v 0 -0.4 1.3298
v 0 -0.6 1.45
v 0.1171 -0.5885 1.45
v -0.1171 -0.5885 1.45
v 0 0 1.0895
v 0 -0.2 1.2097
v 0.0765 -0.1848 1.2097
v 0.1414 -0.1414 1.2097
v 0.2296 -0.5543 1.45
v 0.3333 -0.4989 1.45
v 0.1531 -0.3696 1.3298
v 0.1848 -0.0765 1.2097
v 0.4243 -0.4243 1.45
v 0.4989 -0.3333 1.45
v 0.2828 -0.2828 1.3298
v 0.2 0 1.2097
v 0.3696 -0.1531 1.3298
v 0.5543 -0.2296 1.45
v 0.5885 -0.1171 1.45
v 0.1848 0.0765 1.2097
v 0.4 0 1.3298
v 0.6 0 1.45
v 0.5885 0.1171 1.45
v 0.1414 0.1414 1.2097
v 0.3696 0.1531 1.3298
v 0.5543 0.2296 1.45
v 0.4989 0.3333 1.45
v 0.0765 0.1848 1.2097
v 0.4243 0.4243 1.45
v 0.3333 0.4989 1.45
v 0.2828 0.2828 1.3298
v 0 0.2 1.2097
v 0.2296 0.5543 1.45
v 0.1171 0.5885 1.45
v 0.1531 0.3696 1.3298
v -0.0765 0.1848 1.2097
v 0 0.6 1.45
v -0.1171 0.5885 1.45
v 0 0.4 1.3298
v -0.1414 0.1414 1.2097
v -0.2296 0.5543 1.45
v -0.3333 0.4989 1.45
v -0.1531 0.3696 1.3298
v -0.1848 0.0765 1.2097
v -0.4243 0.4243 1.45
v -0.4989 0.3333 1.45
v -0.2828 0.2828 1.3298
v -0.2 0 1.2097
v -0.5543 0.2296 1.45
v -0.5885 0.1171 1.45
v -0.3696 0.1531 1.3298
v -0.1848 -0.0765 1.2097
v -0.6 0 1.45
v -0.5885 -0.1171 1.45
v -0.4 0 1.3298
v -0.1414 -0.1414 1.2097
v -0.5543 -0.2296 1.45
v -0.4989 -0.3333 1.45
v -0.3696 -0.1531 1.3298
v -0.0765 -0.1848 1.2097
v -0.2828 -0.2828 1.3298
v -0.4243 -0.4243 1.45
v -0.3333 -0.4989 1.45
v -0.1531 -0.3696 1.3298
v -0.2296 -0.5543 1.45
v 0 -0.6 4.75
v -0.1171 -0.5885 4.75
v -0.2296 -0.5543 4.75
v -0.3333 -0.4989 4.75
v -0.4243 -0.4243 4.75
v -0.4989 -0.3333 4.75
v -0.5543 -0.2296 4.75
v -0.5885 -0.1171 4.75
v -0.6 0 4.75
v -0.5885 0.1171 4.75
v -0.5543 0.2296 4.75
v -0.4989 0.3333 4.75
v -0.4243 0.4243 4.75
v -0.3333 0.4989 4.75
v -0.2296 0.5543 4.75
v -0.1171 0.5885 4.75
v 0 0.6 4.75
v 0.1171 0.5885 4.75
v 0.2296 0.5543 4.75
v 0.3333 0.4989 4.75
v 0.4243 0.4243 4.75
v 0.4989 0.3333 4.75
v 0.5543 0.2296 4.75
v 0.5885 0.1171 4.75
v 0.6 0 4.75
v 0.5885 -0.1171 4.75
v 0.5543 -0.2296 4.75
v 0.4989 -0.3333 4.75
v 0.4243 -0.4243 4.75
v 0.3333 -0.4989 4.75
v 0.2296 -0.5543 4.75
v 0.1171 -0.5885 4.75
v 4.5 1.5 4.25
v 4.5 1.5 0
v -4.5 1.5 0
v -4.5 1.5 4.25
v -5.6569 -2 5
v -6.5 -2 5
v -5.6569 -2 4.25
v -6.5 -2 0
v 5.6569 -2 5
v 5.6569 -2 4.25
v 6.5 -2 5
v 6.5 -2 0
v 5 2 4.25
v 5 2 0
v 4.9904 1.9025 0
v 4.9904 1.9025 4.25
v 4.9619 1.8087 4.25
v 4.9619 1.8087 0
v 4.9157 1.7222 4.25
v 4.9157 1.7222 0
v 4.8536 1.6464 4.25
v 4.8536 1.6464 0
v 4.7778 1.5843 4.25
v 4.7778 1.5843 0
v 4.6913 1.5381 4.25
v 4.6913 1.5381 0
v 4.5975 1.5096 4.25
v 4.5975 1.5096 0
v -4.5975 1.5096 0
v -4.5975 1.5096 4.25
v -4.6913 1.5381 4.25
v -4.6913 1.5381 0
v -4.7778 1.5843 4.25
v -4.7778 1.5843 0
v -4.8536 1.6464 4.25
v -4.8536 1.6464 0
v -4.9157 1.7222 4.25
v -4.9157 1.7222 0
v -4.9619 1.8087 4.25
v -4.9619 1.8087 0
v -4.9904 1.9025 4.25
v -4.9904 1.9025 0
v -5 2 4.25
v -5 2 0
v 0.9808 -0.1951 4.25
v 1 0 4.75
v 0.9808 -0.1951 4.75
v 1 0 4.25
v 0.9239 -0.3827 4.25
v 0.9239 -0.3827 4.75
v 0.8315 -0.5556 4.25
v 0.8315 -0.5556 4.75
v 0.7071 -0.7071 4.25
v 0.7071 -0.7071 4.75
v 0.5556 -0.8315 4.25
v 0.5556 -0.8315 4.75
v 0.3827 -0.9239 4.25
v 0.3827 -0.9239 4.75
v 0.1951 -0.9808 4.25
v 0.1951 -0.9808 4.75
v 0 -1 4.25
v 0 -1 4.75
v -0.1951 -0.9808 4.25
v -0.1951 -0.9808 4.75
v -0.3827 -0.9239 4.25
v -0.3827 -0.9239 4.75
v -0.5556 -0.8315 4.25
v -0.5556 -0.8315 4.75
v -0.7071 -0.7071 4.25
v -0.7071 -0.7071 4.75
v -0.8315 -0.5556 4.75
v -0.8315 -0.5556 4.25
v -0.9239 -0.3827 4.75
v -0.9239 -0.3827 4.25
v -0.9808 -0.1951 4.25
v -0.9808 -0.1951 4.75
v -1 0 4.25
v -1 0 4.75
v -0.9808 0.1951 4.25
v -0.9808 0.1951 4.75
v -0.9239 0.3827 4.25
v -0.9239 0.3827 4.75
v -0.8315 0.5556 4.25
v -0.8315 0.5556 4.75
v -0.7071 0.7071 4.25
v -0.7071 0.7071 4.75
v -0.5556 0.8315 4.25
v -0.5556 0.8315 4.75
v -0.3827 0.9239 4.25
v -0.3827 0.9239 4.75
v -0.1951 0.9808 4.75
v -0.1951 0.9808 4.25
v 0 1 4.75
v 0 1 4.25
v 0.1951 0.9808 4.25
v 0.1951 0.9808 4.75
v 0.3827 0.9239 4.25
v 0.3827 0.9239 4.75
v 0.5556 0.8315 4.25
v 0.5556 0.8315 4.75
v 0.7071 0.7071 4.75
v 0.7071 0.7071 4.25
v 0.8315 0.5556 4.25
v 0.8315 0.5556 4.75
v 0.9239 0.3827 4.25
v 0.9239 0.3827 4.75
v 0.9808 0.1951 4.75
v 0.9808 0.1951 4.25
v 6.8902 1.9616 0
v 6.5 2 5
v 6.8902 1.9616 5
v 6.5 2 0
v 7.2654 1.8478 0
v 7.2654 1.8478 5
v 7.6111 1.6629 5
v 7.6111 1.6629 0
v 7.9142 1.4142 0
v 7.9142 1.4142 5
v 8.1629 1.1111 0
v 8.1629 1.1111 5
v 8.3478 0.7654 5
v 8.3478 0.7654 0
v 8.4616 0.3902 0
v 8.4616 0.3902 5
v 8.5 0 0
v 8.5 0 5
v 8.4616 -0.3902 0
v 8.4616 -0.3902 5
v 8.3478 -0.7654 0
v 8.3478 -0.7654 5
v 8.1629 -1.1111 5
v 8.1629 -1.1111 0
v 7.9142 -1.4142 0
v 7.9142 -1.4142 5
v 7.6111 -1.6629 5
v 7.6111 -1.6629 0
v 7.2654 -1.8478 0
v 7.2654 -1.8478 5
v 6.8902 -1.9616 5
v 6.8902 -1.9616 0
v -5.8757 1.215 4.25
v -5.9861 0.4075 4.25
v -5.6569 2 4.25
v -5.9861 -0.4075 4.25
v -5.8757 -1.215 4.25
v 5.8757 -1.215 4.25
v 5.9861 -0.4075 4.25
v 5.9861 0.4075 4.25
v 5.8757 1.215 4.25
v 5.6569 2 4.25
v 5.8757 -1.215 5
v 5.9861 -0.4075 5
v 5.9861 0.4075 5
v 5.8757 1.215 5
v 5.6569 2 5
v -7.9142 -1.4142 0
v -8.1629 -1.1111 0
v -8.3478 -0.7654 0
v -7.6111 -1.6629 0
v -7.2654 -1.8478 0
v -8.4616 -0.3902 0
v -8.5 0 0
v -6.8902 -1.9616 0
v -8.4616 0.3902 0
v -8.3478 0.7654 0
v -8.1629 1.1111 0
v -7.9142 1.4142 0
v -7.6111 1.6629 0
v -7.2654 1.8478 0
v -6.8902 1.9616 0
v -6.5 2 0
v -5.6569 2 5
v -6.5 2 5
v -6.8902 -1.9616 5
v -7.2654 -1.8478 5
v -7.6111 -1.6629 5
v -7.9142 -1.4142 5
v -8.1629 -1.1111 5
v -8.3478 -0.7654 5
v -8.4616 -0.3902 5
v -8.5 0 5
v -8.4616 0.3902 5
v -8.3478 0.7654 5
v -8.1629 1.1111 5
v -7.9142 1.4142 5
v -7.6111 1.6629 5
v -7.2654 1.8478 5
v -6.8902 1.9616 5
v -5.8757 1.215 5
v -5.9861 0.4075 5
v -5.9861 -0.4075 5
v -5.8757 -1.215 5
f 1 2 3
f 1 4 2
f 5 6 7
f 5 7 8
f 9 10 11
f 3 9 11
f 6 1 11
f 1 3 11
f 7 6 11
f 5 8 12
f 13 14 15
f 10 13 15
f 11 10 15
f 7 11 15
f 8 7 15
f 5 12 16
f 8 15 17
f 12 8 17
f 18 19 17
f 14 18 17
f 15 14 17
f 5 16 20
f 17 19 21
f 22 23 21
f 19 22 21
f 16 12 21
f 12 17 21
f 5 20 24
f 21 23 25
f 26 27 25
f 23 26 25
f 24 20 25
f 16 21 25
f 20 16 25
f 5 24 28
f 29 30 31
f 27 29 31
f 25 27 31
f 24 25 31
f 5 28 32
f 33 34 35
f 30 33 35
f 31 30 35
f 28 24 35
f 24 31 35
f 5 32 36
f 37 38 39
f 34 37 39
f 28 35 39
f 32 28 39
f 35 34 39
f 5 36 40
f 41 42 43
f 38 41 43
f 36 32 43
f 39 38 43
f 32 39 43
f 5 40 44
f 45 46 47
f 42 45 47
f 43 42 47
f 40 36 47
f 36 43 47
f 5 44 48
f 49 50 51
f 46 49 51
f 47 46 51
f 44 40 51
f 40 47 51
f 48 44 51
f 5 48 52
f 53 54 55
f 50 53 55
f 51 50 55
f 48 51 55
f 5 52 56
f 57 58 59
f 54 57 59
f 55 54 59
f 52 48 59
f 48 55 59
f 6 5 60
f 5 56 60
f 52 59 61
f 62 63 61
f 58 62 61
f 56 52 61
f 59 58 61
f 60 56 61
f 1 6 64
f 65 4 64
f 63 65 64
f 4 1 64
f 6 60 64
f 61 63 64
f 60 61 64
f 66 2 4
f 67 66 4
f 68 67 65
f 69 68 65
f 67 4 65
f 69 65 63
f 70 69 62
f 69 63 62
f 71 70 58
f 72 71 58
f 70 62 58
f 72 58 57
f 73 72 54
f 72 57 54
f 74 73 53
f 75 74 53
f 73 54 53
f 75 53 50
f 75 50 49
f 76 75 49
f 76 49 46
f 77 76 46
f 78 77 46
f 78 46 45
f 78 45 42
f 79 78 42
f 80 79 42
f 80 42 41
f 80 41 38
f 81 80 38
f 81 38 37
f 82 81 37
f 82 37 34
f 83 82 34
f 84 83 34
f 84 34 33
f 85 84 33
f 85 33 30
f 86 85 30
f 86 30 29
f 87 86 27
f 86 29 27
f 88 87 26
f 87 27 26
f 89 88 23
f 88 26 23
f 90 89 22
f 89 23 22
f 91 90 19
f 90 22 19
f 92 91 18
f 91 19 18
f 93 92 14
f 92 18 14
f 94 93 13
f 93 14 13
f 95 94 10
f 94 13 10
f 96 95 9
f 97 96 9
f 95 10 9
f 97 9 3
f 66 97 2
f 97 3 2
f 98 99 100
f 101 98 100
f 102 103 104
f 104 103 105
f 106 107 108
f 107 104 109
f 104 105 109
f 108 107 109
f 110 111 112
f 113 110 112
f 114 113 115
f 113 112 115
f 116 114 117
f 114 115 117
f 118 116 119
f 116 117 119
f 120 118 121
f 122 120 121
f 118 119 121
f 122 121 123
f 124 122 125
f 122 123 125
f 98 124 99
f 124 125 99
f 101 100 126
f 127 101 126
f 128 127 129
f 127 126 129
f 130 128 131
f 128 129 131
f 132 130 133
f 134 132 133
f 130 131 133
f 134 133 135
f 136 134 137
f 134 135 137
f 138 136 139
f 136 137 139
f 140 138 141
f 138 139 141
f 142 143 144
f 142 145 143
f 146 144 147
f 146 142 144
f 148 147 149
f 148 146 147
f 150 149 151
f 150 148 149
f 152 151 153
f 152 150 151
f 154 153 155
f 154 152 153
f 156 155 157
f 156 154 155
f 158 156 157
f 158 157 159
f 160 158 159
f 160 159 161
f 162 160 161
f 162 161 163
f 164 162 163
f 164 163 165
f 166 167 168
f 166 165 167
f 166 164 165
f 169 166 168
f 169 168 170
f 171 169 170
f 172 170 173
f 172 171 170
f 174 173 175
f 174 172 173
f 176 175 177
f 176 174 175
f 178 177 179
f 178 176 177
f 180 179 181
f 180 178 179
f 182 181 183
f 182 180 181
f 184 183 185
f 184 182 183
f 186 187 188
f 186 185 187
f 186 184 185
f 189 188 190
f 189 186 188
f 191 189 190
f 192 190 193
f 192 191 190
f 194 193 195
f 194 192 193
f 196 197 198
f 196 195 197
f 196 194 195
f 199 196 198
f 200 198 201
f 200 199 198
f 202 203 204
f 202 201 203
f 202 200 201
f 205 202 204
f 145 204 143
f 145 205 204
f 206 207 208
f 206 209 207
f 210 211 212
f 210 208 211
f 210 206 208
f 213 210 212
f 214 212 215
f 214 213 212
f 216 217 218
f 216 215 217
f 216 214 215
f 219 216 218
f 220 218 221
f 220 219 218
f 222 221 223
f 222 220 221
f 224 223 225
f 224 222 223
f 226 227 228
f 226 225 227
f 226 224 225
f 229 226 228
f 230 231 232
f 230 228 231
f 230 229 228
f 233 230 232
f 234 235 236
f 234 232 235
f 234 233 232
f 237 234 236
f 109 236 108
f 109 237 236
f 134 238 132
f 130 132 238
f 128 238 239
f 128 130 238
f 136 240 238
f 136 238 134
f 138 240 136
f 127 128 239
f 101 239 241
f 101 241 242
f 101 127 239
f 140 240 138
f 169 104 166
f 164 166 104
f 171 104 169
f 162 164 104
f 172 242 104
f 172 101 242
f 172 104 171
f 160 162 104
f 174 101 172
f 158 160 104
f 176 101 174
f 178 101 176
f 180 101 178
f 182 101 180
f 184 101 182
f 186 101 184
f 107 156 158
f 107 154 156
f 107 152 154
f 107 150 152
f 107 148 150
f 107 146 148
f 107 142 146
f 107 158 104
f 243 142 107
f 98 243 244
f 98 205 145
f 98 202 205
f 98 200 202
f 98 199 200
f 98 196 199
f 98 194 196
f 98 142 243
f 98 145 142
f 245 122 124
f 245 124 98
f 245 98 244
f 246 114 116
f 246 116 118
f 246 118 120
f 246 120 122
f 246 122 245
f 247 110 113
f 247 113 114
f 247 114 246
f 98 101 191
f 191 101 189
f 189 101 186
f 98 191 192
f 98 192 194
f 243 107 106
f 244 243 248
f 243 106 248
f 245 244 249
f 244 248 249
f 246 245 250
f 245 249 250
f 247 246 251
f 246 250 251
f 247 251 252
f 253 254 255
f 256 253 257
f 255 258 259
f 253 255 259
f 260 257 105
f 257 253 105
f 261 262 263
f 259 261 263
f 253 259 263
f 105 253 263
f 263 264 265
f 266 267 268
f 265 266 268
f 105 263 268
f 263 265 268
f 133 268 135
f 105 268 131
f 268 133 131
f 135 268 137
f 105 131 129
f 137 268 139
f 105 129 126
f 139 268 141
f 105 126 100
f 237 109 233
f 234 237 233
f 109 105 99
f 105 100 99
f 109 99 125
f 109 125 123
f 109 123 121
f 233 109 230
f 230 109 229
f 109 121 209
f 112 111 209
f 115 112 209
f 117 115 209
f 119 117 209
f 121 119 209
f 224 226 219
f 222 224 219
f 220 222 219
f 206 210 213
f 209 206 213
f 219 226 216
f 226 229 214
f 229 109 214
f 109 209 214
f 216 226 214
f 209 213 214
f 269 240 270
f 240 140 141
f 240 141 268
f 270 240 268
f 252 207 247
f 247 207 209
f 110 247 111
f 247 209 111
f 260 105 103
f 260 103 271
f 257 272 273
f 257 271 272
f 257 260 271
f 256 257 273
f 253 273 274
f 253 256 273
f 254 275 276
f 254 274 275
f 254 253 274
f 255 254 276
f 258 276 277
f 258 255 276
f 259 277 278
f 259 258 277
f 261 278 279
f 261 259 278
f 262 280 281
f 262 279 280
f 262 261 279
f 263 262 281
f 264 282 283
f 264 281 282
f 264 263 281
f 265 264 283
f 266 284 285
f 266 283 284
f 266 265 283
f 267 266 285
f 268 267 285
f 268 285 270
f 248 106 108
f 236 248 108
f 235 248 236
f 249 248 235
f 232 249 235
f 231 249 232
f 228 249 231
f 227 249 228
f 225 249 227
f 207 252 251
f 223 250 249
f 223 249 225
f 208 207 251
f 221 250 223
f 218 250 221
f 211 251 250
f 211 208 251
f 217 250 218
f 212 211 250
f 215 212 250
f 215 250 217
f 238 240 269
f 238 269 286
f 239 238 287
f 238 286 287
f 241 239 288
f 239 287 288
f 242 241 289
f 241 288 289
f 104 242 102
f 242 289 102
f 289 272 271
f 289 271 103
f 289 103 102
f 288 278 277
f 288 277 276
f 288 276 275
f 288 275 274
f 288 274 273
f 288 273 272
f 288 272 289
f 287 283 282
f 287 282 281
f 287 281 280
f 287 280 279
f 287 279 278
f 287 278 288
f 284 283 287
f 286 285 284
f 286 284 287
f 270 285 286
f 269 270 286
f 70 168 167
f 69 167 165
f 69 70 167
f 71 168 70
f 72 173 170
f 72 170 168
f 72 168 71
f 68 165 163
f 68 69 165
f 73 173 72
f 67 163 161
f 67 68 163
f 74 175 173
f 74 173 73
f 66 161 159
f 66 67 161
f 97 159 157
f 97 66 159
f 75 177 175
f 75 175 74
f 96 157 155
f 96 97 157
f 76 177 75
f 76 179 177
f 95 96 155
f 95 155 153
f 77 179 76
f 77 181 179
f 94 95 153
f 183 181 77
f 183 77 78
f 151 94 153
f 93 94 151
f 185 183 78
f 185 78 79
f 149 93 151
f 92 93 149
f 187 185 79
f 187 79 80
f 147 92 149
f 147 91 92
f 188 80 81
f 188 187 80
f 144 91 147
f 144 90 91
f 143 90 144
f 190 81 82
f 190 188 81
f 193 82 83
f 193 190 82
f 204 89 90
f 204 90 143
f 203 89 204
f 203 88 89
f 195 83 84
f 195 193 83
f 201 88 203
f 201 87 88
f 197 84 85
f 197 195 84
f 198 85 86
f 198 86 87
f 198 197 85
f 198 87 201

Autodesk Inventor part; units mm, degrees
ref_plane "YZ Plane" through (0, 0, 0) normal (1, 0, 0) x (0, 1, 0)
ref_plane "XZ Plane" through (0, 0, 0) normal (0, 1, 0) x (-1, 0, 0)
ref_plane "XY Plane" through (0, 0, 0) normal (0, 0, 1) x (1, 0, 0)
sketch "Sketch1" plane through (0, 0, 0) normal (0, 0, 1) x (1, 0, 0)
  line L0 (-6.5, 0) -> (6.5, 0) construction
  line L1 (-6.5, -2) -> (6.5, -2)
  line L2 (6.5, 2) -> (-6.5, 2)
  arc A0 (-6.5, 2) -> (-6.5, -2) centre (-6.5, 0) ccw
  arc A1 (6.5, -2) -> (6.5, 2) centre (6.5, 0) ccw
  point P0 (0, 0)
  dimension "d0" = 17
  dimension "d1" = 4
extrude "Extrusion1" add sketch "Sketch1" along normal blind 5
sketch "Sketch2" plane through (0, 0, 5) normal (0, 0, 1) x (1, 0, 0)
  circle A0 centre (0, 0) radius 6
  dimension "d4" = 12
extrude "Extrusion2" cut sketch "Sketch2" against normal blind 0.75
sketch "Sketch3" plane through (0, 0, 4.25) normal (0, 0, 1) x (1, 0, 0)
  circle A0 centre (0, 0) radius 1
  dimension "d7" = 2
extrude "Extrusion3" add sketch "Sketch3" along normal blind 0.5
hole "Hole1" at (0, 0, 4.75) direction (0, 0, -1) diameter 1.2 depth 3.3 tip angle 118
sketch "Sketch4" plane through (0, 0, 0) normal (0, 0, -1) x (-1, 0, 0)
  line L0 (6.5, -2) -> (-6.5, -2) projected
  arc A0 (6.5, -2) -> (6.5, 2) centre (6.5, 0) ccw projected
  line L1 (-6.5, 2) -> (6.5, 2) projected
  arc A1 (-6.5, 2) -> (-6.5, -2) centre (-6.5, 0) ccw projected
  line L2 (-4.5, 2) -> (4.5, 2) construction
  line L3 (-6.5, 2) -> (6.5, 2) projected
  line L4 (-4.5, 1.5) -> (4.5, 1.5)
  line L5 (4.5, 2.5) -> (-4.5, 2.5)
  arc A2 (-4.5, 2.5) -> (-4.5, 1.5) centre (-4.5, 2) ccw
  arc A3 (4.5, 1.5) -> (4.5, 2.5) centre (4.5, 2) ccw
  point P0 (0, 0)
  point P1 (0, 2)
  point P2 (0, 2)
  dimension "d19" = 0.5
  dimension "d20" = 10
extrude "Extrusion4" cut sketch "Sketch4" against normal through all contours A3 L4 A2 L1 | L1 A2 L5 A3
properties part number "phalanx_1_gearbox_support"
